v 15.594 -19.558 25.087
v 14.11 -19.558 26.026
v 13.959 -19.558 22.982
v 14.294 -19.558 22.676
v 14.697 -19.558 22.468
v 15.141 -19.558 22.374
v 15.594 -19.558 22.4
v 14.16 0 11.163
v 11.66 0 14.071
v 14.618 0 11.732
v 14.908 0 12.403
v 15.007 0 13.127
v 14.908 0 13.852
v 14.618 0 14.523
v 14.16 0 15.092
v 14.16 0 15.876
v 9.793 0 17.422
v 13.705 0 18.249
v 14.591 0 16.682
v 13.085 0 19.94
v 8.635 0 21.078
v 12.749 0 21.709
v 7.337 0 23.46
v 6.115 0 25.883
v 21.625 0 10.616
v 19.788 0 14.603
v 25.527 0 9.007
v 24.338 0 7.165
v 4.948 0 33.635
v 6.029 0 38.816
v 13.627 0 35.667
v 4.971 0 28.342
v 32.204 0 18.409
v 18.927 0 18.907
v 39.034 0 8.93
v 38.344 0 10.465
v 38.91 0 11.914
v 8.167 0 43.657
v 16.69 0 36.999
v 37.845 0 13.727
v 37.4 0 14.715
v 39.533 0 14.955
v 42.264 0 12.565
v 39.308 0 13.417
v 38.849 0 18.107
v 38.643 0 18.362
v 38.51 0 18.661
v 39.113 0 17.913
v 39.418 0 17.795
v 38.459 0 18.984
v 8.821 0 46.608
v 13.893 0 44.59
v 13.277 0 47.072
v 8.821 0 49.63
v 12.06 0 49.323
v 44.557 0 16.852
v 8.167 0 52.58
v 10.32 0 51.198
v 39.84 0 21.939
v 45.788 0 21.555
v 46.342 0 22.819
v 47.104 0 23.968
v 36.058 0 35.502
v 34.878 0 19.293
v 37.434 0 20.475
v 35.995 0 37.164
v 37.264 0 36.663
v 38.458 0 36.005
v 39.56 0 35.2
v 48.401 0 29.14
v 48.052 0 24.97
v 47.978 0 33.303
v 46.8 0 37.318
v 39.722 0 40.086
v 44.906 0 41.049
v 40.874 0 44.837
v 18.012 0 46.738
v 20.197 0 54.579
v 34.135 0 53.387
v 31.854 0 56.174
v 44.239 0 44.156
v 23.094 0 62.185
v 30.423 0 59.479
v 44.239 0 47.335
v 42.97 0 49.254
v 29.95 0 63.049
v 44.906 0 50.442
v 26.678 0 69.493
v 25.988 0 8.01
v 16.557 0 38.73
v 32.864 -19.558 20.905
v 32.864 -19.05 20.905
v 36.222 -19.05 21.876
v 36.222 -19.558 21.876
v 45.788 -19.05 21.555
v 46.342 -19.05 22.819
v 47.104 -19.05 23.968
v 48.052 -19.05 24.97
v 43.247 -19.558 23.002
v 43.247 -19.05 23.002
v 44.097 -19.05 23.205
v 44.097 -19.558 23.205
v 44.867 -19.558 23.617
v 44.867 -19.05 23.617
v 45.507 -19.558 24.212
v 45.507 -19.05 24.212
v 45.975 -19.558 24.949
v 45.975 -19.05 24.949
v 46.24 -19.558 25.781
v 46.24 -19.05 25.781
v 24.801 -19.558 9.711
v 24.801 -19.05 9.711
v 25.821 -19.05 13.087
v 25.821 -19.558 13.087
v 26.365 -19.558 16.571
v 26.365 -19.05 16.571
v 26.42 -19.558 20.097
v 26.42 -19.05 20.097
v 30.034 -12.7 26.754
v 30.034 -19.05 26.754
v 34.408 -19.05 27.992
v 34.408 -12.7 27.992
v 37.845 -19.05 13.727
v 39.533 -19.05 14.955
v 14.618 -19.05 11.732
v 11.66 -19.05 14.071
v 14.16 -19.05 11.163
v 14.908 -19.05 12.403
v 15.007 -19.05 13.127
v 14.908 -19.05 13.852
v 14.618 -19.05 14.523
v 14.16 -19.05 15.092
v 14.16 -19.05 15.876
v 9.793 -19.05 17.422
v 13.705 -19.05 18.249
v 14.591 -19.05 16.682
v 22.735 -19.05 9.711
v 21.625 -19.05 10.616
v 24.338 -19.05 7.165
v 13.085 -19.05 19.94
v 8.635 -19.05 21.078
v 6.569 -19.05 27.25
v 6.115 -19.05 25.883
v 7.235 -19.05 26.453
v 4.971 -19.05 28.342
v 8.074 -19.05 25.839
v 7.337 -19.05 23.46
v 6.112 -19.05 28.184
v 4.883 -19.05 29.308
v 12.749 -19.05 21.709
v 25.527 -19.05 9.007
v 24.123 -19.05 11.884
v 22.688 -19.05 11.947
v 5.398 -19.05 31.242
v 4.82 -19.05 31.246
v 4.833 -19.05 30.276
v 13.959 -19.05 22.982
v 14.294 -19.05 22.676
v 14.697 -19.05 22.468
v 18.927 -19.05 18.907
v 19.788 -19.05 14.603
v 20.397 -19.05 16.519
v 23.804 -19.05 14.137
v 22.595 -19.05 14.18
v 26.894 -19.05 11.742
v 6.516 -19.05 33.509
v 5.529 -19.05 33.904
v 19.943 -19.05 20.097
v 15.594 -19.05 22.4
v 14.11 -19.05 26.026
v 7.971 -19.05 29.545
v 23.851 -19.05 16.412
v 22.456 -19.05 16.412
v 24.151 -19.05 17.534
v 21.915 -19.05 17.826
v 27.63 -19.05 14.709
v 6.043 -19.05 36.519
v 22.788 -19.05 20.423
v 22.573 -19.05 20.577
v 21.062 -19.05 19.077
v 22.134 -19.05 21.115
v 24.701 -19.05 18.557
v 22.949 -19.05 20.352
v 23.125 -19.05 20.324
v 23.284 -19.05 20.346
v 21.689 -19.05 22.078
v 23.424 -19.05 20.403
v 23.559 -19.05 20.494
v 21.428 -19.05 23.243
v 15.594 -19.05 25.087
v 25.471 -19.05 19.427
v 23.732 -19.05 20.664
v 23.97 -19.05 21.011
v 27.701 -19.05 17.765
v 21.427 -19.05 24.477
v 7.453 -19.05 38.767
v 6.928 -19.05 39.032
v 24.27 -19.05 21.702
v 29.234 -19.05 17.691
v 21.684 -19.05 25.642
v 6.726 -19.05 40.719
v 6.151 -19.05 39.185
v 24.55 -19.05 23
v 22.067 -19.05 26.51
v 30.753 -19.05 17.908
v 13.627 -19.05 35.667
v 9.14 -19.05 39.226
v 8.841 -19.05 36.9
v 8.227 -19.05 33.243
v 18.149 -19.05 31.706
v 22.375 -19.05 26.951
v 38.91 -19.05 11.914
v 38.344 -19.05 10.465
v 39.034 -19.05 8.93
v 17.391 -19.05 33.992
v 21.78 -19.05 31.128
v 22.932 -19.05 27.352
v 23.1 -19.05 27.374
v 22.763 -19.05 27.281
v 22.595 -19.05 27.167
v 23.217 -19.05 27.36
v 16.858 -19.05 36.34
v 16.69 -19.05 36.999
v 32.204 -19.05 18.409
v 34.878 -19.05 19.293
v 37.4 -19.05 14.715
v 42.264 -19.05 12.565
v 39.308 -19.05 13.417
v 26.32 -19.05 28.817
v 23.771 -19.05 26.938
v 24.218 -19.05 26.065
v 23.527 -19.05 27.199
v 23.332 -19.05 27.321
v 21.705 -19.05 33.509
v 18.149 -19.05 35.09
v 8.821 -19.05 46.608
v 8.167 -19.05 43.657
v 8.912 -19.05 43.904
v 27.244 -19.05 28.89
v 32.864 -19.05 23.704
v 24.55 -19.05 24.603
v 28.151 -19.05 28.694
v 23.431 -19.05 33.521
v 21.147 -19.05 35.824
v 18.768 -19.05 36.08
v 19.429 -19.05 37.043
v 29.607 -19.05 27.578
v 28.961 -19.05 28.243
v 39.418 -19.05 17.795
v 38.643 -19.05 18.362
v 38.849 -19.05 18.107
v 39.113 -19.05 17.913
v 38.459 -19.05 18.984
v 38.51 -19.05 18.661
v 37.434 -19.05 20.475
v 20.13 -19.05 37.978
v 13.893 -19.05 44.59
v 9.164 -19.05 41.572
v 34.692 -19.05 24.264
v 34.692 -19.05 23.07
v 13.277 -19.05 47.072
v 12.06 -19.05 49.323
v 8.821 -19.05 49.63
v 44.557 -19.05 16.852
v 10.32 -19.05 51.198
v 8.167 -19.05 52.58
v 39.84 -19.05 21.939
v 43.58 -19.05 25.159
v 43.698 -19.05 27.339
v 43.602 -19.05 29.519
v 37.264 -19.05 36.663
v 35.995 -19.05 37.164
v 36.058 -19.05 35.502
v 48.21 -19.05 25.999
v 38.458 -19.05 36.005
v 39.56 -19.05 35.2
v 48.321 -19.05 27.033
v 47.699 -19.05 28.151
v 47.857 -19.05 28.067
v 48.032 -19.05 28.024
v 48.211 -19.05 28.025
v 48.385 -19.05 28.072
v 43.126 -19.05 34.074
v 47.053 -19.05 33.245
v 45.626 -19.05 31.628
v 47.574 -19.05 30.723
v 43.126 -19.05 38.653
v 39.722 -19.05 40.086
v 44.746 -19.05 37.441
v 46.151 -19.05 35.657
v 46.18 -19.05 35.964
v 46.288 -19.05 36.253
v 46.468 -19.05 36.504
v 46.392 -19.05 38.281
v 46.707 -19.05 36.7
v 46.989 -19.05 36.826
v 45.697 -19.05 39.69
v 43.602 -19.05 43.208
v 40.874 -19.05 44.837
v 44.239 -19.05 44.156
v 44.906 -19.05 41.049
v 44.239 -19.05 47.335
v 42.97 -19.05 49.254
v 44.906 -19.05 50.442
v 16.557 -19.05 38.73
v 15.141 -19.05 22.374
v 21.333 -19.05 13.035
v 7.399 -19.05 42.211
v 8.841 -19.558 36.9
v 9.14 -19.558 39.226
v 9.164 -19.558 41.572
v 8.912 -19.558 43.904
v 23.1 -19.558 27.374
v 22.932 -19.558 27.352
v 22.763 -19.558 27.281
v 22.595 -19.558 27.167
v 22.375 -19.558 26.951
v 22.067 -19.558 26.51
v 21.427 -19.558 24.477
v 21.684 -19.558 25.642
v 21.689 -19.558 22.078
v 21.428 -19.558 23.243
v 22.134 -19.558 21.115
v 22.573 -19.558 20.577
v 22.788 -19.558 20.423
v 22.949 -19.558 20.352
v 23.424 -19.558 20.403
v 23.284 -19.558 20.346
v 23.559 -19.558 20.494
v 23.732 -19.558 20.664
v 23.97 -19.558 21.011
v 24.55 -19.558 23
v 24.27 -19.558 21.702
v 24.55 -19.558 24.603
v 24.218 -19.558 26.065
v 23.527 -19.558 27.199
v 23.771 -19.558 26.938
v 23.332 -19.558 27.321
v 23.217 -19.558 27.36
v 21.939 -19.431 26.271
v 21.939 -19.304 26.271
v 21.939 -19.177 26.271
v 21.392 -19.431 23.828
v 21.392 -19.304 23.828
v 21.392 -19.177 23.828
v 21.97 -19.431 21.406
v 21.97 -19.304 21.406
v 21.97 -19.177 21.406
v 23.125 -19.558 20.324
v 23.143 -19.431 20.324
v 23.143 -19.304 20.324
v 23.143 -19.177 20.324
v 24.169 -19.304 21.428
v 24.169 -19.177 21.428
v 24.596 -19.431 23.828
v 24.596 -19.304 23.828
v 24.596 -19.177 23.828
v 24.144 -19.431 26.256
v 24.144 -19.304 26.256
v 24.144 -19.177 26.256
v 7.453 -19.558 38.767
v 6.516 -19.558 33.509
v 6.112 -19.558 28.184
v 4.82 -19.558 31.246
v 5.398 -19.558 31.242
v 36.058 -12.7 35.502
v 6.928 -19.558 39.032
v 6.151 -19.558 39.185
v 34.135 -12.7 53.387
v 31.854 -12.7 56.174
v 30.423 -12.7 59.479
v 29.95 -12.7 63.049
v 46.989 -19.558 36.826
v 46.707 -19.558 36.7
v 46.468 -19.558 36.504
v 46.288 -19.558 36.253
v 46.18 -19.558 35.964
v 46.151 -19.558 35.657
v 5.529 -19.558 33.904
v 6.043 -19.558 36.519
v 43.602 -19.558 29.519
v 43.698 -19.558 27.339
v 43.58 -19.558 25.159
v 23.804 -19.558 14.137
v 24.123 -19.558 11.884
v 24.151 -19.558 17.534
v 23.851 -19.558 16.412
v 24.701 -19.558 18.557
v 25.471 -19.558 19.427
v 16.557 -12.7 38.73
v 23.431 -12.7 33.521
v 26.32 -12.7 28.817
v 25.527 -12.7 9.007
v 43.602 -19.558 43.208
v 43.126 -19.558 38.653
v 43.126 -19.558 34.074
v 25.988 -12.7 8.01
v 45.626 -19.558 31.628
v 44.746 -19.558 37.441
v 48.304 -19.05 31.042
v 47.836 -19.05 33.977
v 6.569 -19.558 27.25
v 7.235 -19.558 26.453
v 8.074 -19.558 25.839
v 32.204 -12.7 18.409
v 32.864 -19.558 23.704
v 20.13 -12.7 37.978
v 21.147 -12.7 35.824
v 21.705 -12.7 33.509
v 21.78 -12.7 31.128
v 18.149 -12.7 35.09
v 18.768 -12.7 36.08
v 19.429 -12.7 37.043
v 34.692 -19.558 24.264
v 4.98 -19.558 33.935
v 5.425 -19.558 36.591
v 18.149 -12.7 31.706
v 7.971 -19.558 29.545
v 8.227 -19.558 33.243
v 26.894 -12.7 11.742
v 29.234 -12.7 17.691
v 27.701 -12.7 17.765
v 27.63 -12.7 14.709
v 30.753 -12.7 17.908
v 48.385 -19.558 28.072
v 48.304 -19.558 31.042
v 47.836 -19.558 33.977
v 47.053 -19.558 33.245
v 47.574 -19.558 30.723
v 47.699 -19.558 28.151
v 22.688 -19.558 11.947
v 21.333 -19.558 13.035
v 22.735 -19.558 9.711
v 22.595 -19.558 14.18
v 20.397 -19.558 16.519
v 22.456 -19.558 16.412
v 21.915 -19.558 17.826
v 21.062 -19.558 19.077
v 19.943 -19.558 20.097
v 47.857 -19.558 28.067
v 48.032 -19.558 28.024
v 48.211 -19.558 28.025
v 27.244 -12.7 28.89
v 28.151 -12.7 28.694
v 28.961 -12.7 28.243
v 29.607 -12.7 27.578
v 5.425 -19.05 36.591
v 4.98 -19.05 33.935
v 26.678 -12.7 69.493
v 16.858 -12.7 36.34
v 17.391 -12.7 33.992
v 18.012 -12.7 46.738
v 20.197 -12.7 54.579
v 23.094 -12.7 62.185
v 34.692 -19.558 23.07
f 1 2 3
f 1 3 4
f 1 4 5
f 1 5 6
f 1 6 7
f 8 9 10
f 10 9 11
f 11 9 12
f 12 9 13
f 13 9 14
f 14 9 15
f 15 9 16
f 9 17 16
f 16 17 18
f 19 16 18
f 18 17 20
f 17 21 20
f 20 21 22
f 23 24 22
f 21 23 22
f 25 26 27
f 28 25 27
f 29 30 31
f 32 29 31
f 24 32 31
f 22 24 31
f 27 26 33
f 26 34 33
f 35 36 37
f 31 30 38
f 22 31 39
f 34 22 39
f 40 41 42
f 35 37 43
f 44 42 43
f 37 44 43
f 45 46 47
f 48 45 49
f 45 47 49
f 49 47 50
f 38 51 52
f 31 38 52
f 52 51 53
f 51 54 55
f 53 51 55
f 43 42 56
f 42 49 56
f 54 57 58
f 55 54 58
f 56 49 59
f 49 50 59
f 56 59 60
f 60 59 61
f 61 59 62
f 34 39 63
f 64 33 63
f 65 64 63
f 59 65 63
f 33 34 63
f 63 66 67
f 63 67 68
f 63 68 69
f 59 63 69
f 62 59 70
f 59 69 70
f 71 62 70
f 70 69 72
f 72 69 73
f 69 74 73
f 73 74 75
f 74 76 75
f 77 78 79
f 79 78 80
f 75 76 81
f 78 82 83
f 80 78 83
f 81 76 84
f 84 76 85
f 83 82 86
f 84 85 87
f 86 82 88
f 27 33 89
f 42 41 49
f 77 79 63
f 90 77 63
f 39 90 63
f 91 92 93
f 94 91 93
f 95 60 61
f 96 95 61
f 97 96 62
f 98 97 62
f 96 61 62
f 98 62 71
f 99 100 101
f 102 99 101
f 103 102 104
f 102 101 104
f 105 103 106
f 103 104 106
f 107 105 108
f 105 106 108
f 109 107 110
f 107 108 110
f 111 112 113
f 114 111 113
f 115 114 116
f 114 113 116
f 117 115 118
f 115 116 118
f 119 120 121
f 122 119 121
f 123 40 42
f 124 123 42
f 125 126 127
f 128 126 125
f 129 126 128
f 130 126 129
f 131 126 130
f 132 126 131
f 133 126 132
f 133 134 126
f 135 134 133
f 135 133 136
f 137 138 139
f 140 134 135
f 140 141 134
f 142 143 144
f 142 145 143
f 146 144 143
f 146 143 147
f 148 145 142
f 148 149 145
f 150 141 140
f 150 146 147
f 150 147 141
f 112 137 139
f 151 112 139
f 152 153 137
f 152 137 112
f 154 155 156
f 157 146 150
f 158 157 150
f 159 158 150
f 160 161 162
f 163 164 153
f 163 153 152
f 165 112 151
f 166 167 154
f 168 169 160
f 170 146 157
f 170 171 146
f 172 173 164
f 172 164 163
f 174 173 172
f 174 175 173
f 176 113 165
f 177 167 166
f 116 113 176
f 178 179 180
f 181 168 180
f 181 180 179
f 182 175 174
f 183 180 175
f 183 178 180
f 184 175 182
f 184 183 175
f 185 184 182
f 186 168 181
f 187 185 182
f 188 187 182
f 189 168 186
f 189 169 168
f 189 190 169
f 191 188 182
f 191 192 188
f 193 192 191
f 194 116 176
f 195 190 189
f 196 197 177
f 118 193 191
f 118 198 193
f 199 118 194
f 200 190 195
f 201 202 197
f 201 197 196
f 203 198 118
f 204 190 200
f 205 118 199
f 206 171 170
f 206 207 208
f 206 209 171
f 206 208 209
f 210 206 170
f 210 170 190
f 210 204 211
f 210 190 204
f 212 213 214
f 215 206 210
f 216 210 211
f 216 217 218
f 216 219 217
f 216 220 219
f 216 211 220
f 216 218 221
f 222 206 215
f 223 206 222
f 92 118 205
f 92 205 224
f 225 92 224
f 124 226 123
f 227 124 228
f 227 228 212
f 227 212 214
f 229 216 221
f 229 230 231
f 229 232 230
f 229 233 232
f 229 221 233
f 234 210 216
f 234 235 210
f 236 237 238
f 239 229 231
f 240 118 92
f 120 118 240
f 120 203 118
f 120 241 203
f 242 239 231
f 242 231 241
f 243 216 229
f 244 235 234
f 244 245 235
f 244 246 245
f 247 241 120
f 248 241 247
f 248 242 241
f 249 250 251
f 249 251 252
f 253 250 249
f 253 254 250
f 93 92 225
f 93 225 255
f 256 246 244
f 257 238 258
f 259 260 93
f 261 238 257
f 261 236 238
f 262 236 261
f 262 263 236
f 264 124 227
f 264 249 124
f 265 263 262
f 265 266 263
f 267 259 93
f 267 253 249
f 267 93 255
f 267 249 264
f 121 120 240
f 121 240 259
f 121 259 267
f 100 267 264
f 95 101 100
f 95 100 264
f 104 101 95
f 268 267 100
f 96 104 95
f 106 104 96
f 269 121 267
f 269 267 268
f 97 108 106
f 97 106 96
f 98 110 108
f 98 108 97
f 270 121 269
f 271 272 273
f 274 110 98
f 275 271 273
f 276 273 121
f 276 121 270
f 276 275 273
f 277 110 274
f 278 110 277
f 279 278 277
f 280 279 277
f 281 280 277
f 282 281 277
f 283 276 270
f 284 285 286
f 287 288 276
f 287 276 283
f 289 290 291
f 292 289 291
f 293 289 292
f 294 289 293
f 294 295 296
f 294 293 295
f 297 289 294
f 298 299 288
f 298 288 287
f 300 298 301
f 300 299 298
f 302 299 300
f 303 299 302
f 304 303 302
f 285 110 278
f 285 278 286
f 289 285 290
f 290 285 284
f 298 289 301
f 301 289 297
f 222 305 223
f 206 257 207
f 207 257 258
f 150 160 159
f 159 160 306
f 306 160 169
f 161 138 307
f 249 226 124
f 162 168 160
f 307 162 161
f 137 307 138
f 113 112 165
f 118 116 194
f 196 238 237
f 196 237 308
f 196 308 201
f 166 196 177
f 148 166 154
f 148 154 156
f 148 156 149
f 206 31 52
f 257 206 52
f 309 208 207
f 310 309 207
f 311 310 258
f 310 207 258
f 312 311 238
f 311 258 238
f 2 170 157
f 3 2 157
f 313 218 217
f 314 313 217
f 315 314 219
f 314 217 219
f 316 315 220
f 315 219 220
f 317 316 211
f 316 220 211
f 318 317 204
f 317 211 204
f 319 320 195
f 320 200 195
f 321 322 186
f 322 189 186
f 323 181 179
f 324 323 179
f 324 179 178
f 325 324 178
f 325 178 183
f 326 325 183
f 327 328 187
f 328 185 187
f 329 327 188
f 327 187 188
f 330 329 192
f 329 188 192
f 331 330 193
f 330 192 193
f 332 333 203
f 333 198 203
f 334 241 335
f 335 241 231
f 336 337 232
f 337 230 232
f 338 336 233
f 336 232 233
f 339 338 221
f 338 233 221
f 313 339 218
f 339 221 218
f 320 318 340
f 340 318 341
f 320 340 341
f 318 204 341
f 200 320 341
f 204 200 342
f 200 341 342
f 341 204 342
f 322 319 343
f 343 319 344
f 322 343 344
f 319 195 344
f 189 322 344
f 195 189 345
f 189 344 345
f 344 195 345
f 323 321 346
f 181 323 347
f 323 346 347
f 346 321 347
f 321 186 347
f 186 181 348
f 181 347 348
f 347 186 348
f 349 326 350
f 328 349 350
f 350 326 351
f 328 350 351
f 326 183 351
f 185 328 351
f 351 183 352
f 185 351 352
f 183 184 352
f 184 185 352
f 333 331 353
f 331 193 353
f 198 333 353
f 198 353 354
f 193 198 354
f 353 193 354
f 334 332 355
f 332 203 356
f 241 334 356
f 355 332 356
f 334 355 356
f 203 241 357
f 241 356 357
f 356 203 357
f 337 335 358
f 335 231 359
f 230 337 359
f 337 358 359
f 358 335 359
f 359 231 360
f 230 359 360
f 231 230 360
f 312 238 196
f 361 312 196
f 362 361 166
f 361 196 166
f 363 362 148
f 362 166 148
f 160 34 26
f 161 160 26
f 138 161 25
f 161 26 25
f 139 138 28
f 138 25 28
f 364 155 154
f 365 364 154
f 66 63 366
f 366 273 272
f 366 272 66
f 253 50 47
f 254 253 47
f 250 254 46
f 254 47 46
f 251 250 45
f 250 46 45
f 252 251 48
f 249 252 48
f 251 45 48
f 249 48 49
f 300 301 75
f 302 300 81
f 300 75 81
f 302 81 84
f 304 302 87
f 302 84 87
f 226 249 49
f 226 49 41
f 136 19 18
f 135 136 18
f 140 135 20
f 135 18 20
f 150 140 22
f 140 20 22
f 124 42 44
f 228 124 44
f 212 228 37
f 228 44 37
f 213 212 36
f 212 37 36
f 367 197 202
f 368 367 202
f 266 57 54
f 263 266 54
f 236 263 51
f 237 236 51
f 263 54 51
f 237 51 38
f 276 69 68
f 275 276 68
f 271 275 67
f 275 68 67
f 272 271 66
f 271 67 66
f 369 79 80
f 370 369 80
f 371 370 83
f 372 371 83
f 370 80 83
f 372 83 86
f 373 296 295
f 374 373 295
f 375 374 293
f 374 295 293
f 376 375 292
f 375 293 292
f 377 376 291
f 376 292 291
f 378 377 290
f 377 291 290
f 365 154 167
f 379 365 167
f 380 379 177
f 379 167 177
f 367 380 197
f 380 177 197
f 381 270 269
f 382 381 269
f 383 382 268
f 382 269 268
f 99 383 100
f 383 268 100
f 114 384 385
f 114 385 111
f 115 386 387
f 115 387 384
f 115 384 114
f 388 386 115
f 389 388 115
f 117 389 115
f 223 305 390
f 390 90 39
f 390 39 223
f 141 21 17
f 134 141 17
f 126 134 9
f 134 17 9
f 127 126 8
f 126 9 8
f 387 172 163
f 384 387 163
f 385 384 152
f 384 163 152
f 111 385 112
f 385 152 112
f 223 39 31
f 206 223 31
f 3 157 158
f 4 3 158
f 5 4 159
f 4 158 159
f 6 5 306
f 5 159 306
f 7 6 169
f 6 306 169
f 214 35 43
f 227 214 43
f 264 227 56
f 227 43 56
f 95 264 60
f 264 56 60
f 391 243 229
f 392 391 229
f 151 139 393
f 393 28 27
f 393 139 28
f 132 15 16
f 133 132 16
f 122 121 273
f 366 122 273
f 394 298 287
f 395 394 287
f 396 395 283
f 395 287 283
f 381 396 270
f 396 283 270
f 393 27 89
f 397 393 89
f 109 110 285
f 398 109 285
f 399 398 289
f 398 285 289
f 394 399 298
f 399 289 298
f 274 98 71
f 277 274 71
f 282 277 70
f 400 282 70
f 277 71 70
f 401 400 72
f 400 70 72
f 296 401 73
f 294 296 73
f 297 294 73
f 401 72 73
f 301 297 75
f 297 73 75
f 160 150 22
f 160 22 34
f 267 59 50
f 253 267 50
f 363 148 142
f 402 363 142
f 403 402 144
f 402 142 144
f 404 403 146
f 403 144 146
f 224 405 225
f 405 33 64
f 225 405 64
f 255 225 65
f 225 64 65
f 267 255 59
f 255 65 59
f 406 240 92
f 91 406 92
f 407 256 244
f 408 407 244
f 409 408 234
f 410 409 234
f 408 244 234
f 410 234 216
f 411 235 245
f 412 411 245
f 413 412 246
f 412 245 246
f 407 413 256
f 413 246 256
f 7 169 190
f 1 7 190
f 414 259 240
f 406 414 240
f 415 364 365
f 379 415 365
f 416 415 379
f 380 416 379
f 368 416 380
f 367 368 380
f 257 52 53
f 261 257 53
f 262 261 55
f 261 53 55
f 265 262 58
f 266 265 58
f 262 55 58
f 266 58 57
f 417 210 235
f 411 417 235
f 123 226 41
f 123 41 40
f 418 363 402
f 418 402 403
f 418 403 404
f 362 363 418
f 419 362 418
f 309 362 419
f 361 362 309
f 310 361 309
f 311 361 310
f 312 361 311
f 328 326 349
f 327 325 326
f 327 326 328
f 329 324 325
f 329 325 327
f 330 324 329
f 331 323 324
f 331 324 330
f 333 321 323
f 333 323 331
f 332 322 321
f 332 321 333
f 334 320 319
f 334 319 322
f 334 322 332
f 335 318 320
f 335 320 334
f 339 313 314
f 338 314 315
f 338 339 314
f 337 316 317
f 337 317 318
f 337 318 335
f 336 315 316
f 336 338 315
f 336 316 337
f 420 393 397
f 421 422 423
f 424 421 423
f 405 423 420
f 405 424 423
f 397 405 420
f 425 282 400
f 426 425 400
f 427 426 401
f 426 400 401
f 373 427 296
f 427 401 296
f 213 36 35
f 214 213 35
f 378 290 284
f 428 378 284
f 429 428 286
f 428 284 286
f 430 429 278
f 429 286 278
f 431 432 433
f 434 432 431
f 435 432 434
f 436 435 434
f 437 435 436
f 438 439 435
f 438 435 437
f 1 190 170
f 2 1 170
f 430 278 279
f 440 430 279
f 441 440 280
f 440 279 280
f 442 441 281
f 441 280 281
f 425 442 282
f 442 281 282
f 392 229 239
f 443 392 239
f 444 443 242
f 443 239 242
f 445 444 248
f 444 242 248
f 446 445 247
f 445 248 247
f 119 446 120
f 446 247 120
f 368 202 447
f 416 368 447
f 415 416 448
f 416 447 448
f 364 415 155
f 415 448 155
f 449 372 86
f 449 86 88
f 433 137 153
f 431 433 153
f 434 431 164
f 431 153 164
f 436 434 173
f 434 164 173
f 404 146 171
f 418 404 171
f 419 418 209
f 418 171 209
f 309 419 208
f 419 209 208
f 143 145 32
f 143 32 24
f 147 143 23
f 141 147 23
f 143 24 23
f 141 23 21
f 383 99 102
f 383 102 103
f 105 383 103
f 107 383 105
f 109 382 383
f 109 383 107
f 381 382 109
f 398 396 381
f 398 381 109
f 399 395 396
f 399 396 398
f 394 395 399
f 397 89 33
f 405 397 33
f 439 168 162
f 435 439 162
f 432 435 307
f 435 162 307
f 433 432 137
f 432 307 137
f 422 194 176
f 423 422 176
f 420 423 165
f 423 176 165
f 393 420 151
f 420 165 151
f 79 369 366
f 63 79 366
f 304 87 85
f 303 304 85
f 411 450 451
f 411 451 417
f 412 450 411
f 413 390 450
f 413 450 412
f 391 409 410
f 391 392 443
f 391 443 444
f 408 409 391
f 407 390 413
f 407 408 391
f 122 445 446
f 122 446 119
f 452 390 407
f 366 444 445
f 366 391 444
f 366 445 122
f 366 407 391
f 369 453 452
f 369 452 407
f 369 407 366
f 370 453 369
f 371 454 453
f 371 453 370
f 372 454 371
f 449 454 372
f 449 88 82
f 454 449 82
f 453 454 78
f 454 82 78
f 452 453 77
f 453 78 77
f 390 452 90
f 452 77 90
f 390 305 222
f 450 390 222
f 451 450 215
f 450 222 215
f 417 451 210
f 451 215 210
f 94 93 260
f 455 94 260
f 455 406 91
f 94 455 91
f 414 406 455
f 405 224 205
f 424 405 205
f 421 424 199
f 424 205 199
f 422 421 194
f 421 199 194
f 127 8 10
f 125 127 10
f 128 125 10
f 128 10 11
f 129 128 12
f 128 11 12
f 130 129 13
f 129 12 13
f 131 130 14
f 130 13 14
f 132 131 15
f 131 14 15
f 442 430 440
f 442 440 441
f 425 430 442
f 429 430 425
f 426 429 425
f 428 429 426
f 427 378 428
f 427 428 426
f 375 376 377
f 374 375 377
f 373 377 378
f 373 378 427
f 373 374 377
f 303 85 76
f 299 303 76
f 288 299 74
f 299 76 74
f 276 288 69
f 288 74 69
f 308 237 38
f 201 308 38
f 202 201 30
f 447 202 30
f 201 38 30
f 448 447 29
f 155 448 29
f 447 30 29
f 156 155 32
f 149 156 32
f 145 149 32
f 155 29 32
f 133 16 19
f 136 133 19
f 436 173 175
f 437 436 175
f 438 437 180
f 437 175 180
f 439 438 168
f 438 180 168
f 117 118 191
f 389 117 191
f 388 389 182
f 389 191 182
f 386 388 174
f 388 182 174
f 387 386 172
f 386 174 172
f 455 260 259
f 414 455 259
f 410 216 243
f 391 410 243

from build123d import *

# Parameters (mm, degrees)
F1_DEPTH = 19.05
F3_DEPTH = 6.35
F5_DEPTH = 0.508
F7_DEPTH = 19.05


with BuildPart() as f1:
    # F0 (on Front) → F1 (new body)
    with BuildSketch(Plane.XZ):
        with BuildLine():
            Line((29.9496520311, 63.0492046475), (26.6780648381, 69.4930180907))
            ThreePointArc((26.6780648381, 69.4930180907), (20.196677745, 54.5788891456), (16.5568571538, 38.7298725545))
            Line((16.5568571538, 38.7298725545), (16.690030694, 36.9986146688))
            Line((16.690030694, 36.9986146688), (13.6270336807, 35.6668755412))
            Line((13.6270336807, 35.6668755412), (13.8933807611, 44.5895195007))
            ThreePointArc((13.8933807611, 44.5895195007), (12.059862786, 49.3226978569), (8.1669082865, 52.579946816))
            ThreePointArc((8.1669082865, 52.579946816), (8.9030534245, 48.1186248362), (8.1669082865, 43.6573028564))
            ThreePointArc((8.1669082865, 43.6573028564), (5.3520163839, 36.253752533), (4.9707368016, 28.3423177898))
            ThreePointArc((4.9707368016, 28.3423177898), (6.7166015974, 24.6666402647), (8.6351158097, 21.0780538619))
            ThreePointArc((8.6351158097, 21.0780538619), (10.6419239697, 15.6995218737), (14.1597287729, 11.1629003659))
            ThreePointArc((14.1597287729, 11.1629003659), (15.0065668093, 13.1274904124), (14.1597287729, 15.092080459))
            Line((14.1597287729, 15.092080459), (14.1597287729, 15.8760100603))
            Line((14.1597287729, 15.8760100603), (14.5907411352, 16.6818480939))
            ThreePointArc((14.5907411352, 16.6818480939), (13.3602258193, 19.0818671101), (12.7488272265, 21.7087380588))
            Line((12.7488272265, 21.7087380588), (18.9269129187, 18.9074929804))
            ThreePointArc((18.9269129187, 18.9074929804), (20.5891941392, 12.5557803876), (24.337535724, 7.1652918123))
            Line((24.337535724, 7.1652918123), (25.5271047354, 9.0072061867))
            Line((25.5271047354, 9.0072061867), (25.9875822812, 8.0095026642))
            Line((25.9875822812, 8.0095026642), (32.2040431201, 18.4086412191))
            ThreePointArc((32.2040431201, 18.4086412191), (36.1728690985, 19.8478549134), (39.840310812, 21.9389759004))
            Line((39.840310812, 21.9389759004), (38.4588763118, 18.9842395484))
            ThreePointArc((38.4588763118, 18.9842395484), (38.7377638768, 18.2275381272), (39.4182056189, 17.7946705371))
            Line((39.4182056189, 17.7946705371), (37.4002235949, 14.7152889057))
            Line((37.4002235949, 14.7152889057), (37.8449037671, 13.7271098793))
            Line((37.8449037671, 13.7271098793), (39.5333245397, 14.955053106))
            ThreePointArc((39.5333245397, 14.955053106), (39.1304643178, 12.6593692531), (38.343757391, 10.4653881863))
            Line((38.343757391, 10.4653881863), (39.0344746411, 8.9304596186))
            ThreePointArc((39.0344746411, 8.9304596186), (43.5369991038, 14.6406633619), (45.7881577313, 21.5552449226))
            ThreePointArc((45.7881577313, 21.5552449226), (46.6985474779, 23.4097692807), (48.0521768332, 24.9704606831))
            ThreePointArc((48.0521768332, 24.9704606831), (47.9784626543, 33.30312196), (44.9055731297, 41.0488322377))
            ThreePointArc((44.9055731297, 41.0488322377), (44.1544418608, 45.7455441356), (44.9055731297, 50.4422560334))
            Line((44.9055731297, 50.4422560334), (42.9699420929, 49.2538958788))
            ThreePointArc((42.9699420929, 49.2538958788), (40.1761373605, 42.4912587379), (39.559867233, 35.2002494037))
            ThreePointArc((39.559867233, 35.2002494037), (37.8715608426, 36.3530467771), (35.9947867692, 37.1636264026))
            Line((35.9947867692, 37.1636264026), (34.1347455978, 53.3873215318))
            ThreePointArc((34.1347455978, 53.3873215318), (31.023684759, 57.7770885722), (29.9496520311, 63.0492046475))
        make_face()
    extrude(amount=F1_DEPTH)

    # F2 (on face) → F3 (cut)
    with BuildSketch(Plane.XZ.offset(19.05)):
        with BuildLine():
            Line((36.058422178, 35.5022437871), (34.1347455978, 53.3873215318))
            ThreePointArc((34.1347455978, 53.3873215318), (31.023684759, 57.7770885722), (29.9496520311, 63.0492046475))
            Line((29.9496520311, 63.0492046475), (26.6780648381, 69.4930180907))
            ThreePointArc((26.6780648381, 69.4930180907), (20.196677745, 54.5788891456), (16.5568571538, 38.7298725545))
            ThreePointArc((16.5568571538, 38.7298725545), (17.0958351547, 35.1595534204), (18.1488934904, 31.7057520151))
            Line((18.1488934904, 31.7057520151), (18.1488934904, 35.0895822048))
            ThreePointArc((18.1488934904, 35.0895822048), (19.0937254429, 36.5651386602), (20.1296713203, 37.9782170057))
            ThreePointArc((20.1296713203, 37.9782170057), (21.4851518176, 34.6808703775), (21.7803176492, 31.128026545))
            Line((21.7803176492, 31.128026545), (23.4309658408, 33.5214659572))
            Line((23.4309658408, 33.5214659572), (26.3196006417, 28.8171190768))
            ThreePointArc((26.3196006417, 28.8171190768), (28.572476319, 28.4980796307), (30.0335567445, 26.753809303))
            Line((30.0335567445, 26.753809303), (34.4077758491, 27.9917959124))
            Line((34.4077758491, 27.9917959124), (36.058422178, 35.5022437871))
        make_face()
        with BuildLine():
            ThreePointArc((27.7005694807, 17.765365541), (27.3434417277, 13.2052238558), (25.5271047354, 9.0072061867))
            Line((25.5271047354, 9.0072061867), (25.9875822812, 8.0095026642))
            Line((25.9875822812, 8.0095026642), (32.2040431201, 18.4086412191))
            ThreePointArc((32.2040431201, 18.4086412191), (29.9985149549, 17.7635037289), (27.7005694807, 17.765365541))
        make_face()
    extrude(amount=-F3_DEPTH, mode=Mode.SUBTRACT)

    # F4 (on face) → F5 (join)
    with BuildSketch(Plane.XZ.offset(19.05)):
        with BuildLine():
            ThreePointArc((46.2402813137, 25.7814861834), (45.2187335689, 34.5397157881), (43.6017140746, 43.207783252))
            ThreePointArc((43.6017140746, 43.207783252), (43.0662958477, 36.3634908572), (43.6017140746, 29.5191984624))
            ThreePointArc((43.6017140746, 29.5191984624), (43.6658279482, 26.2475841373), (43.2472340763, 23.0022259057))
            ThreePointArc((43.2472340763, 23.0022259057), (45.2061975799, 23.8938442422), (46.2402813137, 25.7814861834))
        make_face()
        with BuildLine():
            add(Edge.make_bspline(
                [(23.1004096568, 27.3739621043), (22.294183528, 27.387058336), (20.4669677334, 23.8183321525), (23.2573713599, 18.5786067922), (25.274701666, 23.8290656185), (23.8975818691, 27.3610129433), (23.1004096568, 27.3739621043)],
                knots=[0, 0, 0, 0, 0.2520256396, 0.5034254726, 0.7508046074, 1, 1, 1, 1], degree=3))
        make_face()
        with BuildLine():
            ThreePointArc((26.4196954668, 20.0969539583), (24.7008830261, 18.5573119841), (23.8514598459, 16.4117831737))
            ThreePointArc((23.8514598459, 16.4117831737), (23.9183277727, 13.0038753965), (24.8005911708, 9.7114723176))
            ThreePointArc((24.8005911708, 9.7114723176), (26.1535443213, 14.8194965183), (26.4196954668, 20.0969539583))
        make_face()
        with BuildLine():
            ThreePointArc((22.4556811154, 16.4117831737), (21.5251128707, 18.4763731071), (19.9432764202, 20.0969539583))
            ThreePointArc((19.9432764202, 20.0969539583), (20.8059126552, 14.7609071695), (22.7348357439, 9.7114723176))
            ThreePointArc((22.7348357439, 9.7114723176), (22.6477960375, 13.0638166167), (22.4556811154, 16.4117831737))
        make_face()
        with BuildLine():
            ThreePointArc((47.6991795003, 28.1513109803), (48.0318296747, 28.0236684218), (48.3848965621, 28.0715488384))
            ThreePointArc((48.3848965621, 28.0715488384), (48.1179191479, 32.5176082952), (46.9887144833, 36.8261600773))
            ThreePointArc((46.9887144833, 36.8261600773), (46.369528668, 36.3848095296), (46.1505949497, 35.6566272676))
            ThreePointArc((46.1505949497, 35.6566272676), (47.3623200822, 31.9942253821), (47.6991795003, 28.1513109803))
        make_face()
        with BuildLine():
            ThreePointArc((8.9119747281, 43.9040847123), (6.9184195013, 36.1498479724), (6.1123180203, 28.1841307878))
            ThreePointArc((6.1123180203, 28.1841307878), (6.8779842089, 26.8316177222), (8.073723875, 25.838771835))
            ThreePointArc((8.073723875, 25.838771835), (8.0540428558, 31.3970840751), (8.8405050337, 36.899510771))
            ThreePointArc((8.8405050337, 36.899510771), (9.1865848284, 40.3986312024), (8.9119747281, 43.9040847123))
        make_face()
        with BuildLine():
            ThreePointArc((5.3984993137, 31.2417112291), (5.7384809183, 35.2204489081), (6.927839946, 39.0324518085))
            Line((6.927839946, 39.0324518085), (6.1507176873, 39.1854316164))
            ThreePointArc((6.1507176873, 39.1854316164), (5.1668291163, 35.2690259496), (4.820222396, 31.2458264954))
            Line((4.820222396, 31.2458264954), (5.3984993137, 31.2417112291))
        make_face()
        Polygon((32.8636430204, 20.9054443985), (36.2221449614, 21.8757595867), (34.6921607852, 23.0699963868), (34.6921607852, 24.2642313242), (32.8636430204, 23.7044338137), align=None)
        with BuildLine():
            Line((14.1096655279, 26.0258354247), (13.9593891799, 22.9824855924))
            ThreePointArc((13.9593891799, 22.9824855924), (14.6970245146, 22.4682314443), (15.5936423689, 22.4001165479))
            Line((15.5936423689, 22.4001165479), (15.5936423689, 25.0865276903))
            Line((15.5936423689, 25.0865276903), (14.1096655279, 26.0258354247))
        make_face()
    extrude(amount=F5_DEPTH)

    # F6 (on face) → F7 (cut, through all)
    with BuildSketch(Plane.XZ.offset(19.05)):
        Polygon((36.058422178, 35.5022437871), (35.9947867692, 37.1636264026), (34.1347455978, 53.3873215318), align=None)
    extrude(amount=-F7_DEPTH, mode=Mode.SUBTRACT)


solid = f1.part
